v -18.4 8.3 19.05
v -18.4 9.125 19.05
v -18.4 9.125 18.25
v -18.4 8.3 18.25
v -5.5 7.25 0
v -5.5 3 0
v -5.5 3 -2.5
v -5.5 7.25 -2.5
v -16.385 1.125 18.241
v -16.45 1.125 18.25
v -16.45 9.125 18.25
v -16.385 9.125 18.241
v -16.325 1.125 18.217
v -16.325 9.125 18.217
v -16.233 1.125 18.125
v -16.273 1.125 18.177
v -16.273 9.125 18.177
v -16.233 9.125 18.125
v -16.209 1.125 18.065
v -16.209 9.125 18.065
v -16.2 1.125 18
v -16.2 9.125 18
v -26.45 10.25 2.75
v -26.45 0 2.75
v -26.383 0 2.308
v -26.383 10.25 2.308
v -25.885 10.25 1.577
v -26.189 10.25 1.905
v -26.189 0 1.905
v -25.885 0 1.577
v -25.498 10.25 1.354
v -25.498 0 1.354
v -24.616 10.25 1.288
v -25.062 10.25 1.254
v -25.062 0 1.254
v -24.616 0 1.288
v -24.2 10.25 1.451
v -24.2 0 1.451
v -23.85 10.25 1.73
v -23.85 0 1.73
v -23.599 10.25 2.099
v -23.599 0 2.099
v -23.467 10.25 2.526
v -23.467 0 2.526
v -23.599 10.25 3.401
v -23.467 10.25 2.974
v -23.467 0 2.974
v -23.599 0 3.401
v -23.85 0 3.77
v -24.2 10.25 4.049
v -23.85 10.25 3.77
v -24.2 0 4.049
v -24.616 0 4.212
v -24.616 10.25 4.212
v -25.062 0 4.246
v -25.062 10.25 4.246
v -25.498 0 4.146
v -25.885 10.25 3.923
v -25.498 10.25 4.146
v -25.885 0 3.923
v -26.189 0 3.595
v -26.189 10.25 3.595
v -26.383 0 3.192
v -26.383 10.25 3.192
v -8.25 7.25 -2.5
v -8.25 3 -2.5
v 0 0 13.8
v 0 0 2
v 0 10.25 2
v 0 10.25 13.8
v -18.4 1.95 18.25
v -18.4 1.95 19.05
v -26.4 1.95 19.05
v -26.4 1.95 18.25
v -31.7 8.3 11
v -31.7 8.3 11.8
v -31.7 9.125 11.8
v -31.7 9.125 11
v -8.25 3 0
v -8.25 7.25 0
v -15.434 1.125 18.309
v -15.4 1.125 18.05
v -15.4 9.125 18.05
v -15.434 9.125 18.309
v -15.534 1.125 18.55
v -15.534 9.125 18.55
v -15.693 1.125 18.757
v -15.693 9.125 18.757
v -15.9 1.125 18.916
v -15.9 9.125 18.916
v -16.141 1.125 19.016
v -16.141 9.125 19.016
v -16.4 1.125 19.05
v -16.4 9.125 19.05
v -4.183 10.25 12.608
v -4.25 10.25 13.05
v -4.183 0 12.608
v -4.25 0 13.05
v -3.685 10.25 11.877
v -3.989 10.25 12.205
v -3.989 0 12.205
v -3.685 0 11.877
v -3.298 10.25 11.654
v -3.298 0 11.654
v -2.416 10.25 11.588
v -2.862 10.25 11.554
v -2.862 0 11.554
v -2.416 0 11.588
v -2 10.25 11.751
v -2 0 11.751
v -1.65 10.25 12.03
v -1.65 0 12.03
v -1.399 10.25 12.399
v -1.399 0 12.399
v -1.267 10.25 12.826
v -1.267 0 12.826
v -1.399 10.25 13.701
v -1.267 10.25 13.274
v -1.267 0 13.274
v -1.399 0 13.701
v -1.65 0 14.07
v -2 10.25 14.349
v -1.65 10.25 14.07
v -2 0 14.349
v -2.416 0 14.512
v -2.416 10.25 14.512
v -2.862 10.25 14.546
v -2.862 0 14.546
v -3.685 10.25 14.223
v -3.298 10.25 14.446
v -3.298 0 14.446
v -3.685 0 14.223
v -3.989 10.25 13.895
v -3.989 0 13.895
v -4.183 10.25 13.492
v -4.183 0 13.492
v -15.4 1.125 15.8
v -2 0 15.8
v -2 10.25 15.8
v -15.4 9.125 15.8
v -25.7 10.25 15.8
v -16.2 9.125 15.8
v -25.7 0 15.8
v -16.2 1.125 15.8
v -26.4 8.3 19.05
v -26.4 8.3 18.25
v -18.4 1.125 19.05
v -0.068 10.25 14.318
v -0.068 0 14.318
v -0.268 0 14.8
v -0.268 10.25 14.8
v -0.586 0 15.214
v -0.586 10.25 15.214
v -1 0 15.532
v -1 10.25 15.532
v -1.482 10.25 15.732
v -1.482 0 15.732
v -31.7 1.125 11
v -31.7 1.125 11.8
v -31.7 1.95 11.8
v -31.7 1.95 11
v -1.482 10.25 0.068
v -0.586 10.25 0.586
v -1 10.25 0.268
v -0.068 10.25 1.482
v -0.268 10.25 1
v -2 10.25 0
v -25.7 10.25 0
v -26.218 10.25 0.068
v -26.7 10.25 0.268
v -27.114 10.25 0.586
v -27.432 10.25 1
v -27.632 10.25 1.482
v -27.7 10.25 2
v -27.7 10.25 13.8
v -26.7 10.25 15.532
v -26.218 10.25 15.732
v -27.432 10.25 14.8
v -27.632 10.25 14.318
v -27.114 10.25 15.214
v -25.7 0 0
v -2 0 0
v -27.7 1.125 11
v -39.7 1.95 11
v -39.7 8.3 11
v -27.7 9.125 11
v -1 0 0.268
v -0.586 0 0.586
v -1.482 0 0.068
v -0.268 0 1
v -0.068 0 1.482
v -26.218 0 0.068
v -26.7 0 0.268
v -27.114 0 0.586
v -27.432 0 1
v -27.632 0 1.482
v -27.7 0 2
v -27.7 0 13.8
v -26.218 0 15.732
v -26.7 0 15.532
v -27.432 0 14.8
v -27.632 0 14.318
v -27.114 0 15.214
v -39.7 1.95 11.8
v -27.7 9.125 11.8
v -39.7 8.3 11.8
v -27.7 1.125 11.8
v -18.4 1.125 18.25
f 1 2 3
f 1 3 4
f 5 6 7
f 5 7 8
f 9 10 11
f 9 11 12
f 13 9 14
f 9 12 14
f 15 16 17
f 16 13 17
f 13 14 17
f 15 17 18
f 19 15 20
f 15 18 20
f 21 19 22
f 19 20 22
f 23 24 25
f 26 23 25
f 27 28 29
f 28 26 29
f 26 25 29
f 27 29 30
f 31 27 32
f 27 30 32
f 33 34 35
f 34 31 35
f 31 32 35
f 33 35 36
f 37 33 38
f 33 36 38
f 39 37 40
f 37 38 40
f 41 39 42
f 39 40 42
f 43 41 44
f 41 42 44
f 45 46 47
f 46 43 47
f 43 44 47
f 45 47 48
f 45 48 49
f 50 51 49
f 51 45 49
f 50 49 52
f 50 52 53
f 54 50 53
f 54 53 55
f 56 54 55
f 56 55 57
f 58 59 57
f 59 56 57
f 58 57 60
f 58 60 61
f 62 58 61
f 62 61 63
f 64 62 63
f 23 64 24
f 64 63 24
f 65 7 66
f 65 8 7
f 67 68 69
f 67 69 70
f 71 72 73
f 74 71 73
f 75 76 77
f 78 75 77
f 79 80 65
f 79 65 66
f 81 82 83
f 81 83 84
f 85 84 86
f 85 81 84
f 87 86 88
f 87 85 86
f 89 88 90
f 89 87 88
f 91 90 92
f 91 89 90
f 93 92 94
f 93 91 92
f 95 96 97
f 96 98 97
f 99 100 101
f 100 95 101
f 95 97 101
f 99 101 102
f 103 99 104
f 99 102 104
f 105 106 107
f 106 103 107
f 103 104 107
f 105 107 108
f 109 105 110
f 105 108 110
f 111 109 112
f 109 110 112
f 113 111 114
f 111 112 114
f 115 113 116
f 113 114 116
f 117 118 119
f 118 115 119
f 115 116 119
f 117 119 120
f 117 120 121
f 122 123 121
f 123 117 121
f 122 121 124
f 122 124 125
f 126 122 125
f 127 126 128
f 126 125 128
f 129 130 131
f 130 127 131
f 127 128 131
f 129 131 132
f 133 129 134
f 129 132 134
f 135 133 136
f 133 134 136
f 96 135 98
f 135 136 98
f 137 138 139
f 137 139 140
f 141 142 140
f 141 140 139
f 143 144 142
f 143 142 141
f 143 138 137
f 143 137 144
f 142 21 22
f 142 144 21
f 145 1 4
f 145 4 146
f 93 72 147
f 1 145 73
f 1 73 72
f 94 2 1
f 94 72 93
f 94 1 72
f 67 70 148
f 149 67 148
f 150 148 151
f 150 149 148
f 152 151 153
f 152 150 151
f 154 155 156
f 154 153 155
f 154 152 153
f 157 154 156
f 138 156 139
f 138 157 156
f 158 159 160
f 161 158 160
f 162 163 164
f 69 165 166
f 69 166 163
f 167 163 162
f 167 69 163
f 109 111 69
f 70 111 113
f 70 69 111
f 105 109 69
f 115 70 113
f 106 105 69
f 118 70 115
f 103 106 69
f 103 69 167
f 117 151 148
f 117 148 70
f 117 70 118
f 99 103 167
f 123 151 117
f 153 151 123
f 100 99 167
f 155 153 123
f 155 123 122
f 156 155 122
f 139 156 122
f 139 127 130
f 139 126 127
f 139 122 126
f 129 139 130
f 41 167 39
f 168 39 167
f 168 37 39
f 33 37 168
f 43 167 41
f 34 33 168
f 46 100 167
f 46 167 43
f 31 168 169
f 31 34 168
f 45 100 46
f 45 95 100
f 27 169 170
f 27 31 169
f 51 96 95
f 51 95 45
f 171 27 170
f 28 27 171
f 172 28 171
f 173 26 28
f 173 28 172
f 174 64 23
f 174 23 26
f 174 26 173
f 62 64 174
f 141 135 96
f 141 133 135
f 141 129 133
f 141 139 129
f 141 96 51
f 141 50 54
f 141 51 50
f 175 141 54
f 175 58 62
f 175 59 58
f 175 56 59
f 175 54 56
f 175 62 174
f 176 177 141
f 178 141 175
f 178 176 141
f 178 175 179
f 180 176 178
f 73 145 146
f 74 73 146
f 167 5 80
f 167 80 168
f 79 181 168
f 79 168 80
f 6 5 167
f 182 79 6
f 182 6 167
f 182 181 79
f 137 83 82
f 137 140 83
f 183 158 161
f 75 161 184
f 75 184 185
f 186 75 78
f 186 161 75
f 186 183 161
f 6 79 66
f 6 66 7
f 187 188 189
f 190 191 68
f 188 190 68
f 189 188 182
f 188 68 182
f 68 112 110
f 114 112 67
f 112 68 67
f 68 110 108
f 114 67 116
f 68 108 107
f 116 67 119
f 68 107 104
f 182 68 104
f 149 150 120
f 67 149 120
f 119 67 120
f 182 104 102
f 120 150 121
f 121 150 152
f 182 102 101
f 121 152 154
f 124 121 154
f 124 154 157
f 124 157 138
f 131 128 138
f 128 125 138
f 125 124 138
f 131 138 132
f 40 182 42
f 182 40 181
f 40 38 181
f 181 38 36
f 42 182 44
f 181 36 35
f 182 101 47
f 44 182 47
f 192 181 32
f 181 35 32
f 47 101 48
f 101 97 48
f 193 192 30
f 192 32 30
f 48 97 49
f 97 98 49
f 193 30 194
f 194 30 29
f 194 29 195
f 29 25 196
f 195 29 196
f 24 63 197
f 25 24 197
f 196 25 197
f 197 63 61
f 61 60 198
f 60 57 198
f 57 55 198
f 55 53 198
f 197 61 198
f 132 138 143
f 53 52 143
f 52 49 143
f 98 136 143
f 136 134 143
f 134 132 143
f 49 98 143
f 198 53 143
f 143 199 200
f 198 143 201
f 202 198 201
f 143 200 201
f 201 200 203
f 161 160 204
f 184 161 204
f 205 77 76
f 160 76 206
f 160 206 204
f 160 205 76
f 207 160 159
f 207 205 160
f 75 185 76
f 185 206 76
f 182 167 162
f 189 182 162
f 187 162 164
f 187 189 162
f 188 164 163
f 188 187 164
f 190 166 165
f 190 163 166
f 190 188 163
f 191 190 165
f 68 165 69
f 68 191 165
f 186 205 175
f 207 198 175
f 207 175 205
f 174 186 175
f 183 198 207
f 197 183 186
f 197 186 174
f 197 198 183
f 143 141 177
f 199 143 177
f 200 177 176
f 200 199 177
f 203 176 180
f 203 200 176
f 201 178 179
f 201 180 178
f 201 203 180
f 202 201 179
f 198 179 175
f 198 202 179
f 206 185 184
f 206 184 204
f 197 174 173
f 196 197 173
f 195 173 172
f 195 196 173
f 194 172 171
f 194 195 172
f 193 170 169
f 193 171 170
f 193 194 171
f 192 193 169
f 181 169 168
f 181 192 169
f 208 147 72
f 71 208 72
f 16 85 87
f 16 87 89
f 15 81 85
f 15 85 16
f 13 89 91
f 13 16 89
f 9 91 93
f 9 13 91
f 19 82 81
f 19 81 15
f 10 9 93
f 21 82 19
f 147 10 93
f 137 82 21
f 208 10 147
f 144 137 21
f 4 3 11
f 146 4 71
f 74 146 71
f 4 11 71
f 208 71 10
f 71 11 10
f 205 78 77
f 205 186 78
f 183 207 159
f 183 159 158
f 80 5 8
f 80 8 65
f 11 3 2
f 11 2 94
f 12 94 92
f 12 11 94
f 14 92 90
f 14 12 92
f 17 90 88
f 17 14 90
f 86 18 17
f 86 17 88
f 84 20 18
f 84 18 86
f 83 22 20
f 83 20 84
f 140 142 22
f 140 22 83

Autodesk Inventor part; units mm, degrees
ref_plane "YZ Plane" through (0, 0, 0) normal (1, 0, 0) x (0, 1, 0)
ref_plane "XZ Plane" through (0, 0, 0) normal (0, 1, 0) x (-1, 0, 0)
ref_plane "XY Plane" through (0, 0, 0) normal (0, 0, 1) x (1, 0, 0)
sketch "Sketch1" plane through (0, 0, 0) normal (0, 1, 0) x (-1, 0, 0)
  circle A0 centre (2.75, 13.05) radius 1.5
  circle A1 centre (24.95, 2.75) radius 1.5
  line L0 (2, 15.8) -> (25.7, 15.8)
  line L1 (27.7, 13.8) -> (27.7, 2)
  line L2 (25.7, 0) -> (2, 0)
  line L3 (0, 2) -> (0, 13.8)
  arc A2 (0, 2) -> (2, 0) centre (2, 2) ccw
  arc A3 (25.7, 0) -> (27.7, 2) centre (25.7, 2) ccw
  arc A4 (27.7, 13.8) -> (25.7, 15.8) centre (25.7, 13.8) ccw
  arc A5 (2, 15.8) -> (0, 13.8) centre (2, 13.8) ccw
  point P0 (0, 0)
  point P1 (0, 0)
  point P2 (0, 0)
  dimension "d0" = 10.3
  dimension "d1" = 22.2
  dimension "d2" = 2.75
  dimension "d3" = 2.75
  dimension "d4" = 2.75
  dimension "d5" = 2.75
  dimension "d6" = 3
  dimension "d7" = 2
extrude "Extrusion1" add sketch "Sketch1" along normal blind 10.25
sketch "Sketch2" plane through (-2, 0, 0) normal (0, 0, -1) x (-1, 0, 0)
  line L0 (0, 0) -> (23.7, 0) projected
  line L1 (0, 10.25) -> (23.7, 10.25) projected
  line L2 (0, 0) -> (0, 10.25) projected
  line L3 (3.5, 7.25) -> (6.25, 7.25)
  line L4 (6.25, 7.25) -> (6.25, 3)
  line L5 (6.25, 3) -> (3.5, 3)
  line L6 (3.5, 3) -> (3.5, 7.25)
  point P0 (-2, 0)
  dimension "d10" = 4.25
  dimension "d12" = 2.75
  dimension "d13" = 3
  dimension "d14" = 3
  dimension "d15" = 3.5
extrude "Extrusion2" add sketch "Sketch2" along normal blind 2.5
sketch "Sketch3" plane through (-27.7, 0, 2) normal (-1, 0, 0) x (0, 0, 1)
  line L0 (0, 0) -> (11.8, 0) projected
  line L1 (0, 10.25) -> (11.8, 10.25) projected
  line L2 (9, 9.125) -> (9.8, 9.125)
  line L3 (9.8, 9.125) -> (9.8, 1.125)
  line L4 (9.8, 1.125) -> (9, 1.125)
  line L5 (9, 1.125) -> (9, 9.125)
  line L6 (-2, 0) -> (-2, 10.25) projected
  dimension "d18" = 8
  dimension "d20" = 0.8
  dimension "d21" = 1.125
  dimension "d22" = 1.125
  dimension "d23" = 11
extrude "Extrusion3" add sketch "Sketch3" along normal blind 12
sketch "Sketch5" plane through (-25.7, 0, 15.8) normal (0, 0, 1) x (1, 0, 0)
  line L0 (0, 0) -> (23.7, 0) projected
  line L1 (23.7, 0) -> (23.7, 10.25) projected
  line L2 (0, 10.25) -> (23.7, 10.25) projected
  line L3 (9.5, 9.125) -> (10.3, 9.125)
  line L4 (10.3, 9.125) -> (10.3, 1.125)
  line L5 (10.3, 1.125) -> (9.5, 1.125)
  line L6 (9.5, 1.125) -> (9.5, 9.125)
  line L7 (0, 0) -> (0, 10.25) projected
  point P0 (25.7, 0)
  dimension "d29" = 8
  dimension "d31" = 0.8
  dimension "d33" = 1.125
  dimension "d34" = 1.125
  dimension "d49" = 9.5
  dimension "d50" = 13.4
extrude "Extrusion5" add sketch "Sketch5" along normal blind 3.25 contours L3 L4 L5 L6
sketch "Sketch6" plane through (-15.4, 1.125, 15.8) normal (1, 0, 0) x (0, 0, -1)
  line L0 (0, 0) -> (-3.25, 0) projected
  line L1 (-3.25, 8) -> (-2.45, 8)
  line L2 (-2.45, 8) -> (-2.45, 0)
  line L3 (-2.45, 0) -> (-3.25, 0)
  line L4 (-3.25, 0) -> (-3.25, 8)
  point P0 (15.8, -1.125)
  dimension "d37" = 0.8
extrude "Extrusion6" add sketch "Sketch6" against normal blind 11
fillet "Fillet1" radius 1 1 edges at (-15.4, 5.125, 19.05)
fillet "Fillet2" radius 0.25 1 edges at (-16.2, 5.125, 18.25)
sketch "Sketch9" plane through (-25.7, 0, 19.05) normal (0, 0, 1) x (1, 0, 0)
  line L0 (9.3, 9.125) -> (-0.7, 9.125) projected
  line L1 (-0.7, 1.125) -> (-0.7, 9.125) projected
  line L2 (9.3, 1.125) -> (-0.7, 1.125) projected
  line L3 (7.3, 9.125) -> (7.3, 8.3)
  line L4 (7.3, 8.3) -> (-0.7, 8.3)
  line L5 (7.3, 1.125) -> (7.3, 1.95)
  line L6 (7.3, 1.95) -> (-0.7, 1.95)
  line L7 (10.3, 1.125) -> (10.3, 9.125) projected
  point P0 (25.7, 0)
  dimension "d51" = 6.35
  dimension "d53" = 3
extrude "Extrusion9" cut sketch "Sketch9" against normal up to next
sketch "Sketch10" plane through (-27.7, 1.125, 11.8) normal (0, 0, 1) x (1, 0, 0)
  line L0 (0, 8) -> (-12, 8) projected
  line L1 (-12, 0) -> (-12, 8) projected
  line L2 (0, 0) -> (-12, 0) projected
  line L3 (-12, 7.175) -> (-4, 7.175)
  line L4 (-4, 7.175) -> (-4, 8)
  line L5 (-4, 0) -> (-4, 0.825)
  line L6 (-4, 0.825) -> (-12, 0.825)
  point P0 (27.7, -1.125)
  dimension "d56" = 6.35
  dimension "d57" = 8
extrude "Extrusion10" cut sketch "Sketch10" against normal up to next
equation "\"d3\" = d2"
equation "\"d4\" = d2"
equation "\"d5\" = d2"
equation "\"d13\" = d14"
equation "\"d21\" = d22"
equation "\"d33\" = d34"
properties part number "EndStop_LimitSwitch"
